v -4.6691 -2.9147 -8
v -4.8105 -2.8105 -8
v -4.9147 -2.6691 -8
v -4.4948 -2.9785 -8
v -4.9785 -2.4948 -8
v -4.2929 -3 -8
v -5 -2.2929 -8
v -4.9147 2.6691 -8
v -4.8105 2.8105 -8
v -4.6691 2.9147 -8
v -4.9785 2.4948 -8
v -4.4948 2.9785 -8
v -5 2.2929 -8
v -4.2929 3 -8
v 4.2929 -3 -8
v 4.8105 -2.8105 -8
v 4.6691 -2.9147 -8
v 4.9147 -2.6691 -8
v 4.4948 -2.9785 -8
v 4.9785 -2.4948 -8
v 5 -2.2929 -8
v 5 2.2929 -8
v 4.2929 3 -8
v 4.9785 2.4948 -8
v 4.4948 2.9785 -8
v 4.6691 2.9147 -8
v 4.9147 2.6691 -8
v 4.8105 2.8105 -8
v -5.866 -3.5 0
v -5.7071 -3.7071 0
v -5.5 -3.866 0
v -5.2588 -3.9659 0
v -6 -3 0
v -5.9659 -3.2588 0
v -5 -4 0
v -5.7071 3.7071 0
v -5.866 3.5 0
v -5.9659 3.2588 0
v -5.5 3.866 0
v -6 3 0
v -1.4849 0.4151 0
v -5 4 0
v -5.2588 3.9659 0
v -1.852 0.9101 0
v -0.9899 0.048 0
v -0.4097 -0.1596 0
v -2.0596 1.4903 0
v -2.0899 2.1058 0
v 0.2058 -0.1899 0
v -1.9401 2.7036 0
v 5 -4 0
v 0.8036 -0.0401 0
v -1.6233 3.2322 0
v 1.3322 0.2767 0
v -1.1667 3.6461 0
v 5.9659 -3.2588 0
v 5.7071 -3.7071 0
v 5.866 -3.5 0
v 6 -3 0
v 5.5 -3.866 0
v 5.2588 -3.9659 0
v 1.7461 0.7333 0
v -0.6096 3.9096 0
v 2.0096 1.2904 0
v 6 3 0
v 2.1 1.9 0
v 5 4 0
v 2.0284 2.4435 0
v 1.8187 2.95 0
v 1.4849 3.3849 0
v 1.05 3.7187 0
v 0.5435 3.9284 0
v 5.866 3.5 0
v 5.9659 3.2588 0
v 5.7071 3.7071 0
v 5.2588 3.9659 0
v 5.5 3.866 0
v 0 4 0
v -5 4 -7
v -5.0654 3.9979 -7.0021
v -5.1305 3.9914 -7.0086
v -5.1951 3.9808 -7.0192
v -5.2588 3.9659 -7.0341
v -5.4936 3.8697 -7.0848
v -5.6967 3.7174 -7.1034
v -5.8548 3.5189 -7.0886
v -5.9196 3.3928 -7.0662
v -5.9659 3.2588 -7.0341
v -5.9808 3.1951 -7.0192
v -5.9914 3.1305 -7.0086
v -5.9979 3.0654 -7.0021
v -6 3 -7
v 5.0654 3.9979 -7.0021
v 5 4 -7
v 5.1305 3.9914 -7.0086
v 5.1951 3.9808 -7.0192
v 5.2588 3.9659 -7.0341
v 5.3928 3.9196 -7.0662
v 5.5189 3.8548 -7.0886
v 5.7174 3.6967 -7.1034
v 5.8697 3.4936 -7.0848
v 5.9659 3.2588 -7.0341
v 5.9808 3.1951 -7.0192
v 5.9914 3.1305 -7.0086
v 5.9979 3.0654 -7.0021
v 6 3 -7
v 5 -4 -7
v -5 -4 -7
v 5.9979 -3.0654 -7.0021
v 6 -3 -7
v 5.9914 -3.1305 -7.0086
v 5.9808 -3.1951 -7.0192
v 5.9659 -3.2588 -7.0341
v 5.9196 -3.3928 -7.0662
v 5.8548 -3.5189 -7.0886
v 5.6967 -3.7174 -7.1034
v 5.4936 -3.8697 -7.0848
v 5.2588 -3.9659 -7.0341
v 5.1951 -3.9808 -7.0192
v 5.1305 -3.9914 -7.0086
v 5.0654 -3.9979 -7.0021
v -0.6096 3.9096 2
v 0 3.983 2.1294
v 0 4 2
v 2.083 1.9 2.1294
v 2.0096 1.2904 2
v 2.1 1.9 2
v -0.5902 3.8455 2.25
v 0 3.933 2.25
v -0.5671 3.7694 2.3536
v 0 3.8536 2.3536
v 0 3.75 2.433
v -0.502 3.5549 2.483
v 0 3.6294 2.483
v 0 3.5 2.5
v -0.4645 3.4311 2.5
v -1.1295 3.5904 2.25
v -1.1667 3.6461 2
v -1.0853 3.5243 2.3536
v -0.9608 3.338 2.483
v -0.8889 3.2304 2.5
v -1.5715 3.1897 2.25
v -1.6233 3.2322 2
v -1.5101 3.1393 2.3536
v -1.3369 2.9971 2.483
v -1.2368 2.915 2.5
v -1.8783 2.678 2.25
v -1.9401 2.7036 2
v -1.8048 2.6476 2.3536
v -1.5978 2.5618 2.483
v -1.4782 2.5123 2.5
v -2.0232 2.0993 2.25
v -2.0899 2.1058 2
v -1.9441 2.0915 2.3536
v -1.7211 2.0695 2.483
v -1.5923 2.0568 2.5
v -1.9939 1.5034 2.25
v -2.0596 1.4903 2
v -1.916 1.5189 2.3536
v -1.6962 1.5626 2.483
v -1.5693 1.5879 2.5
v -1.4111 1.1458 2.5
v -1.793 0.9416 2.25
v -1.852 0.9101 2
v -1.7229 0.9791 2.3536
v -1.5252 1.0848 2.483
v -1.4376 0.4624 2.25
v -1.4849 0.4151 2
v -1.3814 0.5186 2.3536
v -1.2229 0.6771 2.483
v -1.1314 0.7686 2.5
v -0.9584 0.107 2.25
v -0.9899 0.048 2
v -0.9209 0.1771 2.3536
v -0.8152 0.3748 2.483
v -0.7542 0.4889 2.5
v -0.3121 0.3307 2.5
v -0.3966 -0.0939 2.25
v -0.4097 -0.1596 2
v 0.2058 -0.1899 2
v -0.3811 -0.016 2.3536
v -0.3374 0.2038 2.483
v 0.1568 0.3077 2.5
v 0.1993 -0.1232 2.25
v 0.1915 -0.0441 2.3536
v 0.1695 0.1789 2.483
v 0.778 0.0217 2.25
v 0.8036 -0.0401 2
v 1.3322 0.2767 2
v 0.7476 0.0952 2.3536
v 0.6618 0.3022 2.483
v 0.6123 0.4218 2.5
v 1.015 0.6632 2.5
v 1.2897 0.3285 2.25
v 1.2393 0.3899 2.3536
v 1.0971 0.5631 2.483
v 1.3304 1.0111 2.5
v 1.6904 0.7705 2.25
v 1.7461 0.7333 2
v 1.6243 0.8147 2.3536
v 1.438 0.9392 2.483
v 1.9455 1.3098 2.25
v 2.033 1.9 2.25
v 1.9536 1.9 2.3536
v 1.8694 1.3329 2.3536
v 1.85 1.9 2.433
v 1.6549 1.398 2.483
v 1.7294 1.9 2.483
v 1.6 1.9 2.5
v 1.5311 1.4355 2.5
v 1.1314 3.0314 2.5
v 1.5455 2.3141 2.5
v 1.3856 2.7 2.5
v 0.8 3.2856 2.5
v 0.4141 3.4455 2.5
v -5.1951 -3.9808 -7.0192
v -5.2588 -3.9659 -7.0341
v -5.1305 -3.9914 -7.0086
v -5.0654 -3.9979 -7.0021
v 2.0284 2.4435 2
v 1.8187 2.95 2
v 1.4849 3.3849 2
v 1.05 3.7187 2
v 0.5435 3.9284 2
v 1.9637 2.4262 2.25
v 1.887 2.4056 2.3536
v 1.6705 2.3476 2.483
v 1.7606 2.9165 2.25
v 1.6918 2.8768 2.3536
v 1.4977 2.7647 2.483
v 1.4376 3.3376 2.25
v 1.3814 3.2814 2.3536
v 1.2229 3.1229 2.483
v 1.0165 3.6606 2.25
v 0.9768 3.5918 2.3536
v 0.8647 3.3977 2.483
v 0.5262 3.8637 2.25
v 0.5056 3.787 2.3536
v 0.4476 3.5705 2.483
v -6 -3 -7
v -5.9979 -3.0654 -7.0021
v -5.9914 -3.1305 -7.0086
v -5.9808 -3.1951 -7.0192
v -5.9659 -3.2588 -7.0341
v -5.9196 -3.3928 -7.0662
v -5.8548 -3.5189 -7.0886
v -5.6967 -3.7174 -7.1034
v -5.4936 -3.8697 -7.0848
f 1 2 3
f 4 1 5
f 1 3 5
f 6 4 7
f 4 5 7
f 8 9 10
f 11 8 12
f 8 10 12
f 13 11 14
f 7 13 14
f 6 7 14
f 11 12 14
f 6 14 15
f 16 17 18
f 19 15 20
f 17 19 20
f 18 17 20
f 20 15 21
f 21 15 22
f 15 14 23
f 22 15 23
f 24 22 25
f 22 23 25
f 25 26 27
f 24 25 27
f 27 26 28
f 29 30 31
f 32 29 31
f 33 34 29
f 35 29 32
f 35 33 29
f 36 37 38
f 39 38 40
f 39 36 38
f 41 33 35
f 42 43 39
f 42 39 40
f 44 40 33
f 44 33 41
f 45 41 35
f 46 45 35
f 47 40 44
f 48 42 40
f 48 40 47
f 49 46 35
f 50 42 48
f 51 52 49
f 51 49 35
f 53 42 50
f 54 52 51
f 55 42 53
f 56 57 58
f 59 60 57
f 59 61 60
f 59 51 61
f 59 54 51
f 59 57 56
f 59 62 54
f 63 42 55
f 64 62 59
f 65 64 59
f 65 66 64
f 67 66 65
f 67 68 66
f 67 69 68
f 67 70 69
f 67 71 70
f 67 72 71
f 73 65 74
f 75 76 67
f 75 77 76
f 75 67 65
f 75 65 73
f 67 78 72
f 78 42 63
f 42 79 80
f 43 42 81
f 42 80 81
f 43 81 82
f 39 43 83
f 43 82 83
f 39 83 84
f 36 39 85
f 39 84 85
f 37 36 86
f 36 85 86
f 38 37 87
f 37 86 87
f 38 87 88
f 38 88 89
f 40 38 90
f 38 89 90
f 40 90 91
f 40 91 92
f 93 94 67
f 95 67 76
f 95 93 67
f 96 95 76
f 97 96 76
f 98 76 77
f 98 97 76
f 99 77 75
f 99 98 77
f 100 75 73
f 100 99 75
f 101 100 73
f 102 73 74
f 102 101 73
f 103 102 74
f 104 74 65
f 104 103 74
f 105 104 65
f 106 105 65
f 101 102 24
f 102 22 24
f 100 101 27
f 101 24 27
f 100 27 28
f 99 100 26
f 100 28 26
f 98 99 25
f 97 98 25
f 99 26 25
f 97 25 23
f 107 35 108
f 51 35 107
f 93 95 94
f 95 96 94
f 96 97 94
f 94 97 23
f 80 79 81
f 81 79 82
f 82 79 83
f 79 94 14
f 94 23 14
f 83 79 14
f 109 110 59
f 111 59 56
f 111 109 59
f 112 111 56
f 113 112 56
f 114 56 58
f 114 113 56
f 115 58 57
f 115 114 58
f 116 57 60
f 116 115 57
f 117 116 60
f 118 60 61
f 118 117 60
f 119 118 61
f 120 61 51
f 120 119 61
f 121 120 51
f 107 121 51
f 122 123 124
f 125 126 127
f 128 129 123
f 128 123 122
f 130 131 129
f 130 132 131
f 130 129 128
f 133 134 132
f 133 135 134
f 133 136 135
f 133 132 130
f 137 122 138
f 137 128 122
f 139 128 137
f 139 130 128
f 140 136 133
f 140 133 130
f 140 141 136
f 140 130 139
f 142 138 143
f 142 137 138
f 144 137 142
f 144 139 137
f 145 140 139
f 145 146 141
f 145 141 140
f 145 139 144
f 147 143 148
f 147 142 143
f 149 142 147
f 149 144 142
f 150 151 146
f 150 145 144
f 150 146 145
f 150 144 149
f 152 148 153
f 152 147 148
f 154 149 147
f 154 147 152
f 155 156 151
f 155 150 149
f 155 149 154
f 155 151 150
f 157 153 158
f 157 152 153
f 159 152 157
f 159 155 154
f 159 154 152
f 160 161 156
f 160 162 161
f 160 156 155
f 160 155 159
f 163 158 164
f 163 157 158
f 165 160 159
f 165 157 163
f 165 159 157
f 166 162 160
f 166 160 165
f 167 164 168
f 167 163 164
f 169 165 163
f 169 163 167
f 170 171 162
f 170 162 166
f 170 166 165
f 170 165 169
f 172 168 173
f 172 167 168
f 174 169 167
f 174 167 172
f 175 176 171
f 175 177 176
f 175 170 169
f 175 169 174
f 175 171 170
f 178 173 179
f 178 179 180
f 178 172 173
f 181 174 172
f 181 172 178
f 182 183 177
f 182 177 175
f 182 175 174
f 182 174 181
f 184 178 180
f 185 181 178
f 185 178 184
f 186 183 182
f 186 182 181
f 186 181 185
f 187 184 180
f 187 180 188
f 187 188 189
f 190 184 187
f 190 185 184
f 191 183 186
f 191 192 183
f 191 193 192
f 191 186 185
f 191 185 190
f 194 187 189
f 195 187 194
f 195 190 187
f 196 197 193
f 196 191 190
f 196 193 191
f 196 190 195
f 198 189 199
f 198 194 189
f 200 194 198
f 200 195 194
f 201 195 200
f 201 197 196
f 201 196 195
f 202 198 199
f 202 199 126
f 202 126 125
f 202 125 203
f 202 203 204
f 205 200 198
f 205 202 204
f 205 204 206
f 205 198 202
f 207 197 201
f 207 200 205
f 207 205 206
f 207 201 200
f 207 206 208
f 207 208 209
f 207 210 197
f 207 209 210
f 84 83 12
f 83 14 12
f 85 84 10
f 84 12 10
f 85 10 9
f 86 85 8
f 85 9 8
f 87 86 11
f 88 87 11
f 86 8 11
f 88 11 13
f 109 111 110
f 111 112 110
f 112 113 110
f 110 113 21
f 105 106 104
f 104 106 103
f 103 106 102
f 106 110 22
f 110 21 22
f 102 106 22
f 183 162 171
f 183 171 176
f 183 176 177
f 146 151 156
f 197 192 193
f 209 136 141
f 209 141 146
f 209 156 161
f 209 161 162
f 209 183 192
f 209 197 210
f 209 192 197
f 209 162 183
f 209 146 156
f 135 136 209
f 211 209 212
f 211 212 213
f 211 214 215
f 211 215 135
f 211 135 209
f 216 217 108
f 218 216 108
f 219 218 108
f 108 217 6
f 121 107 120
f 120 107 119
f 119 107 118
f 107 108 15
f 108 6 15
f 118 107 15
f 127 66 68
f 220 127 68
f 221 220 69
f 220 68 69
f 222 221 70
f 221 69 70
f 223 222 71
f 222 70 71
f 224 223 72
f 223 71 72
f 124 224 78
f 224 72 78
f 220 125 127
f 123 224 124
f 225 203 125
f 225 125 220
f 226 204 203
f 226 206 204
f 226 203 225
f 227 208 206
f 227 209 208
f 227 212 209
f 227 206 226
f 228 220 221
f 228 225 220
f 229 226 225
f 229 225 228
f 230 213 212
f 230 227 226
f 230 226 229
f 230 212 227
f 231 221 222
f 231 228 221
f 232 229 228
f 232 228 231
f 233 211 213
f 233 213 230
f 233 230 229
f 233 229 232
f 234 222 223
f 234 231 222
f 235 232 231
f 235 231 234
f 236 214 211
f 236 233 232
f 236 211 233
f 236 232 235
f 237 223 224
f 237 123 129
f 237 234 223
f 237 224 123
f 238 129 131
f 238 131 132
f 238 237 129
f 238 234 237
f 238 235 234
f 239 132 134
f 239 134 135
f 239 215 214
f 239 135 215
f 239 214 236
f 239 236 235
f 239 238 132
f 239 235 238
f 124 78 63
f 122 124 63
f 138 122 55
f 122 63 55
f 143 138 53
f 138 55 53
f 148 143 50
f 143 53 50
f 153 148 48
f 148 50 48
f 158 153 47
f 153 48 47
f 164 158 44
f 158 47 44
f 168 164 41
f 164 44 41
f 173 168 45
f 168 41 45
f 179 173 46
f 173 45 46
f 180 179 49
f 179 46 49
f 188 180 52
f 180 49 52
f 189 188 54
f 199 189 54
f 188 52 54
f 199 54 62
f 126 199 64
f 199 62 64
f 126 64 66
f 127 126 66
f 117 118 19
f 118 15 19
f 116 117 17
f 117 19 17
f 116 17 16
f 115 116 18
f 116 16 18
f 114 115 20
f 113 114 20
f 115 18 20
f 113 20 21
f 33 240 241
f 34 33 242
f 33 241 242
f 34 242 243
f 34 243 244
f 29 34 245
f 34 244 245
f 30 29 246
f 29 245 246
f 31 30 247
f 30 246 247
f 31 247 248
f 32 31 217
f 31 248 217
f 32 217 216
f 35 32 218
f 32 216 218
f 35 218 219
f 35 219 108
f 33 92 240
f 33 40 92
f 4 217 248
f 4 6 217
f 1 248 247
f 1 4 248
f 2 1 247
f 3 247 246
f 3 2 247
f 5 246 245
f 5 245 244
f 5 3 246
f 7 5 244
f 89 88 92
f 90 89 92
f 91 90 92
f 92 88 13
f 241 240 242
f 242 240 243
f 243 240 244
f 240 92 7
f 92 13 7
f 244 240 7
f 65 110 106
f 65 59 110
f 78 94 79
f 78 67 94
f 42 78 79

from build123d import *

# Parameters (mm, degrees)
F1_DEPTH = 8
F2_DEPTH = 2.5
F3_R     = 0.5
F4_SIZE  = 1
F5_F1_R  = 1
F5_F2_R  = 1
F5_F3_R  = 1
F5_F4_R  = 1
F5_F5_R  = 1
F5_F6_R  = 1
F5_F7_R  = 1
F5_F8_R  = 1


with BuildPart() as f1:
    # F0 (on Top) → F1 (new body)
    with BuildSketch(Plane.XY):
        Polygon((-6, -4), (6, -4), (6, 4), (0, 4), (-6, 4), align=None)
        with BuildLine():
            ThreePointArc((2.1, 1.9), (-1.4849242405, 0.4150757595), (0, 4))
            ThreePointArc((0, 4), (1.4849242405, 3.3849242405), (2.1, 1.9))
        make_face(mode=Mode.SUBTRACT)
        with BuildLine():
            ThreePointArc((2.1, 1.9), (1.4849242405, 3.3849242405), (0, 4))
            ThreePointArc((0, 4), (-1.4849242405, 0.4150757595), (2.1, 1.9))
        make_face()
    extrude(amount=-F1_DEPTH)

    # F0 (on Top) → F2 (join)
    with BuildSketch(Plane.XY):
        with BuildLine():
            ThreePointArc((2.1, 1.9), (1.4849242405, 3.3849242405), (0, 4))
            ThreePointArc((0, 4), (-1.4849242405, 0.4150757595), (2.1, 1.9))
        make_face()
    extrude(amount=F2_DEPTH)

    # F3
    f3_edges = [f1.edges().sort_by_distance(p)[0] for p in [
        (-2.1, 1.9, 2.5),
    ]]
    fillet(f3_edges, radius=F3_R)

    # F4
    f4_edges = [f1.edges().sort_by_distance(p)[0] for p in [
        (-6, 0, -8),
        (0, -4, -8),
        (0, 4, -8),
        (6, 0, -8),
    ]]
    chamfer(f4_edges, length=F4_SIZE)

    # F5: fillet of radius 1 on 8 edges, made by hand

    # F5_f1
    f5_f1_edges = [f1.edges().sort_by_distance(p)[0] for p in [
        (6, 4, -3.5),
    ]]
    fillet(f5_f1_edges, radius=F5_F1_R)

    # F5_f2
    f5_f2_edges = [f1.edges().sort_by_distance(p)[0] for p in [
        (-6, 4, -3.5),
    ]]
    fillet(f5_f2_edges, radius=F5_F2_R)

    # F5_f3
    f5_f3_edges = [f1.edges().sort_by_distance(p)[0] for p in [
        (6, -4, -3.5),
    ]]
    fillet(f5_f3_edges, radius=F5_F3_R)

    # F5_f4
    f5_f4_edges = [f1.edges().sort_by_distance(p)[0] for p in [
        (5.3535533906, 3.3535533906, -7.6464466094),
    ]]
    fillet(f5_f4_edges, radius=F5_F4_R)

    # F5_f5
    f5_f5_edges = [f1.edges().sort_by_distance(p)[0] for p in [
        (-5.3535533906, 3.3535533906, -7.6464466094),
    ]]
    fillet(f5_f5_edges, radius=F5_F5_R)

    # F5_f6
    f5_f6_edges = [f1.edges().sort_by_distance(p)[0] for p in [
        (-6, -4, -3.5),
    ]]
    fillet(f5_f6_edges, radius=F5_F6_R)

    # F5_f7
    f5_f7_edges = [f1.edges().sort_by_distance(p)[0] for p in [
        (5.3535533906, -3.3535533906, -7.6464466094),
    ]]
    fillet(f5_f7_edges, radius=F5_F7_R)

    # F5_f8
    f5_f8_edges = [f1.edges().sort_by_distance(p)[0] for p in [
        (-5.3535533906, -3.3535533906, -7.6464466094),
    ]]
    fillet(f5_f8_edges, radius=F5_F8_R)


solid = f1.part
